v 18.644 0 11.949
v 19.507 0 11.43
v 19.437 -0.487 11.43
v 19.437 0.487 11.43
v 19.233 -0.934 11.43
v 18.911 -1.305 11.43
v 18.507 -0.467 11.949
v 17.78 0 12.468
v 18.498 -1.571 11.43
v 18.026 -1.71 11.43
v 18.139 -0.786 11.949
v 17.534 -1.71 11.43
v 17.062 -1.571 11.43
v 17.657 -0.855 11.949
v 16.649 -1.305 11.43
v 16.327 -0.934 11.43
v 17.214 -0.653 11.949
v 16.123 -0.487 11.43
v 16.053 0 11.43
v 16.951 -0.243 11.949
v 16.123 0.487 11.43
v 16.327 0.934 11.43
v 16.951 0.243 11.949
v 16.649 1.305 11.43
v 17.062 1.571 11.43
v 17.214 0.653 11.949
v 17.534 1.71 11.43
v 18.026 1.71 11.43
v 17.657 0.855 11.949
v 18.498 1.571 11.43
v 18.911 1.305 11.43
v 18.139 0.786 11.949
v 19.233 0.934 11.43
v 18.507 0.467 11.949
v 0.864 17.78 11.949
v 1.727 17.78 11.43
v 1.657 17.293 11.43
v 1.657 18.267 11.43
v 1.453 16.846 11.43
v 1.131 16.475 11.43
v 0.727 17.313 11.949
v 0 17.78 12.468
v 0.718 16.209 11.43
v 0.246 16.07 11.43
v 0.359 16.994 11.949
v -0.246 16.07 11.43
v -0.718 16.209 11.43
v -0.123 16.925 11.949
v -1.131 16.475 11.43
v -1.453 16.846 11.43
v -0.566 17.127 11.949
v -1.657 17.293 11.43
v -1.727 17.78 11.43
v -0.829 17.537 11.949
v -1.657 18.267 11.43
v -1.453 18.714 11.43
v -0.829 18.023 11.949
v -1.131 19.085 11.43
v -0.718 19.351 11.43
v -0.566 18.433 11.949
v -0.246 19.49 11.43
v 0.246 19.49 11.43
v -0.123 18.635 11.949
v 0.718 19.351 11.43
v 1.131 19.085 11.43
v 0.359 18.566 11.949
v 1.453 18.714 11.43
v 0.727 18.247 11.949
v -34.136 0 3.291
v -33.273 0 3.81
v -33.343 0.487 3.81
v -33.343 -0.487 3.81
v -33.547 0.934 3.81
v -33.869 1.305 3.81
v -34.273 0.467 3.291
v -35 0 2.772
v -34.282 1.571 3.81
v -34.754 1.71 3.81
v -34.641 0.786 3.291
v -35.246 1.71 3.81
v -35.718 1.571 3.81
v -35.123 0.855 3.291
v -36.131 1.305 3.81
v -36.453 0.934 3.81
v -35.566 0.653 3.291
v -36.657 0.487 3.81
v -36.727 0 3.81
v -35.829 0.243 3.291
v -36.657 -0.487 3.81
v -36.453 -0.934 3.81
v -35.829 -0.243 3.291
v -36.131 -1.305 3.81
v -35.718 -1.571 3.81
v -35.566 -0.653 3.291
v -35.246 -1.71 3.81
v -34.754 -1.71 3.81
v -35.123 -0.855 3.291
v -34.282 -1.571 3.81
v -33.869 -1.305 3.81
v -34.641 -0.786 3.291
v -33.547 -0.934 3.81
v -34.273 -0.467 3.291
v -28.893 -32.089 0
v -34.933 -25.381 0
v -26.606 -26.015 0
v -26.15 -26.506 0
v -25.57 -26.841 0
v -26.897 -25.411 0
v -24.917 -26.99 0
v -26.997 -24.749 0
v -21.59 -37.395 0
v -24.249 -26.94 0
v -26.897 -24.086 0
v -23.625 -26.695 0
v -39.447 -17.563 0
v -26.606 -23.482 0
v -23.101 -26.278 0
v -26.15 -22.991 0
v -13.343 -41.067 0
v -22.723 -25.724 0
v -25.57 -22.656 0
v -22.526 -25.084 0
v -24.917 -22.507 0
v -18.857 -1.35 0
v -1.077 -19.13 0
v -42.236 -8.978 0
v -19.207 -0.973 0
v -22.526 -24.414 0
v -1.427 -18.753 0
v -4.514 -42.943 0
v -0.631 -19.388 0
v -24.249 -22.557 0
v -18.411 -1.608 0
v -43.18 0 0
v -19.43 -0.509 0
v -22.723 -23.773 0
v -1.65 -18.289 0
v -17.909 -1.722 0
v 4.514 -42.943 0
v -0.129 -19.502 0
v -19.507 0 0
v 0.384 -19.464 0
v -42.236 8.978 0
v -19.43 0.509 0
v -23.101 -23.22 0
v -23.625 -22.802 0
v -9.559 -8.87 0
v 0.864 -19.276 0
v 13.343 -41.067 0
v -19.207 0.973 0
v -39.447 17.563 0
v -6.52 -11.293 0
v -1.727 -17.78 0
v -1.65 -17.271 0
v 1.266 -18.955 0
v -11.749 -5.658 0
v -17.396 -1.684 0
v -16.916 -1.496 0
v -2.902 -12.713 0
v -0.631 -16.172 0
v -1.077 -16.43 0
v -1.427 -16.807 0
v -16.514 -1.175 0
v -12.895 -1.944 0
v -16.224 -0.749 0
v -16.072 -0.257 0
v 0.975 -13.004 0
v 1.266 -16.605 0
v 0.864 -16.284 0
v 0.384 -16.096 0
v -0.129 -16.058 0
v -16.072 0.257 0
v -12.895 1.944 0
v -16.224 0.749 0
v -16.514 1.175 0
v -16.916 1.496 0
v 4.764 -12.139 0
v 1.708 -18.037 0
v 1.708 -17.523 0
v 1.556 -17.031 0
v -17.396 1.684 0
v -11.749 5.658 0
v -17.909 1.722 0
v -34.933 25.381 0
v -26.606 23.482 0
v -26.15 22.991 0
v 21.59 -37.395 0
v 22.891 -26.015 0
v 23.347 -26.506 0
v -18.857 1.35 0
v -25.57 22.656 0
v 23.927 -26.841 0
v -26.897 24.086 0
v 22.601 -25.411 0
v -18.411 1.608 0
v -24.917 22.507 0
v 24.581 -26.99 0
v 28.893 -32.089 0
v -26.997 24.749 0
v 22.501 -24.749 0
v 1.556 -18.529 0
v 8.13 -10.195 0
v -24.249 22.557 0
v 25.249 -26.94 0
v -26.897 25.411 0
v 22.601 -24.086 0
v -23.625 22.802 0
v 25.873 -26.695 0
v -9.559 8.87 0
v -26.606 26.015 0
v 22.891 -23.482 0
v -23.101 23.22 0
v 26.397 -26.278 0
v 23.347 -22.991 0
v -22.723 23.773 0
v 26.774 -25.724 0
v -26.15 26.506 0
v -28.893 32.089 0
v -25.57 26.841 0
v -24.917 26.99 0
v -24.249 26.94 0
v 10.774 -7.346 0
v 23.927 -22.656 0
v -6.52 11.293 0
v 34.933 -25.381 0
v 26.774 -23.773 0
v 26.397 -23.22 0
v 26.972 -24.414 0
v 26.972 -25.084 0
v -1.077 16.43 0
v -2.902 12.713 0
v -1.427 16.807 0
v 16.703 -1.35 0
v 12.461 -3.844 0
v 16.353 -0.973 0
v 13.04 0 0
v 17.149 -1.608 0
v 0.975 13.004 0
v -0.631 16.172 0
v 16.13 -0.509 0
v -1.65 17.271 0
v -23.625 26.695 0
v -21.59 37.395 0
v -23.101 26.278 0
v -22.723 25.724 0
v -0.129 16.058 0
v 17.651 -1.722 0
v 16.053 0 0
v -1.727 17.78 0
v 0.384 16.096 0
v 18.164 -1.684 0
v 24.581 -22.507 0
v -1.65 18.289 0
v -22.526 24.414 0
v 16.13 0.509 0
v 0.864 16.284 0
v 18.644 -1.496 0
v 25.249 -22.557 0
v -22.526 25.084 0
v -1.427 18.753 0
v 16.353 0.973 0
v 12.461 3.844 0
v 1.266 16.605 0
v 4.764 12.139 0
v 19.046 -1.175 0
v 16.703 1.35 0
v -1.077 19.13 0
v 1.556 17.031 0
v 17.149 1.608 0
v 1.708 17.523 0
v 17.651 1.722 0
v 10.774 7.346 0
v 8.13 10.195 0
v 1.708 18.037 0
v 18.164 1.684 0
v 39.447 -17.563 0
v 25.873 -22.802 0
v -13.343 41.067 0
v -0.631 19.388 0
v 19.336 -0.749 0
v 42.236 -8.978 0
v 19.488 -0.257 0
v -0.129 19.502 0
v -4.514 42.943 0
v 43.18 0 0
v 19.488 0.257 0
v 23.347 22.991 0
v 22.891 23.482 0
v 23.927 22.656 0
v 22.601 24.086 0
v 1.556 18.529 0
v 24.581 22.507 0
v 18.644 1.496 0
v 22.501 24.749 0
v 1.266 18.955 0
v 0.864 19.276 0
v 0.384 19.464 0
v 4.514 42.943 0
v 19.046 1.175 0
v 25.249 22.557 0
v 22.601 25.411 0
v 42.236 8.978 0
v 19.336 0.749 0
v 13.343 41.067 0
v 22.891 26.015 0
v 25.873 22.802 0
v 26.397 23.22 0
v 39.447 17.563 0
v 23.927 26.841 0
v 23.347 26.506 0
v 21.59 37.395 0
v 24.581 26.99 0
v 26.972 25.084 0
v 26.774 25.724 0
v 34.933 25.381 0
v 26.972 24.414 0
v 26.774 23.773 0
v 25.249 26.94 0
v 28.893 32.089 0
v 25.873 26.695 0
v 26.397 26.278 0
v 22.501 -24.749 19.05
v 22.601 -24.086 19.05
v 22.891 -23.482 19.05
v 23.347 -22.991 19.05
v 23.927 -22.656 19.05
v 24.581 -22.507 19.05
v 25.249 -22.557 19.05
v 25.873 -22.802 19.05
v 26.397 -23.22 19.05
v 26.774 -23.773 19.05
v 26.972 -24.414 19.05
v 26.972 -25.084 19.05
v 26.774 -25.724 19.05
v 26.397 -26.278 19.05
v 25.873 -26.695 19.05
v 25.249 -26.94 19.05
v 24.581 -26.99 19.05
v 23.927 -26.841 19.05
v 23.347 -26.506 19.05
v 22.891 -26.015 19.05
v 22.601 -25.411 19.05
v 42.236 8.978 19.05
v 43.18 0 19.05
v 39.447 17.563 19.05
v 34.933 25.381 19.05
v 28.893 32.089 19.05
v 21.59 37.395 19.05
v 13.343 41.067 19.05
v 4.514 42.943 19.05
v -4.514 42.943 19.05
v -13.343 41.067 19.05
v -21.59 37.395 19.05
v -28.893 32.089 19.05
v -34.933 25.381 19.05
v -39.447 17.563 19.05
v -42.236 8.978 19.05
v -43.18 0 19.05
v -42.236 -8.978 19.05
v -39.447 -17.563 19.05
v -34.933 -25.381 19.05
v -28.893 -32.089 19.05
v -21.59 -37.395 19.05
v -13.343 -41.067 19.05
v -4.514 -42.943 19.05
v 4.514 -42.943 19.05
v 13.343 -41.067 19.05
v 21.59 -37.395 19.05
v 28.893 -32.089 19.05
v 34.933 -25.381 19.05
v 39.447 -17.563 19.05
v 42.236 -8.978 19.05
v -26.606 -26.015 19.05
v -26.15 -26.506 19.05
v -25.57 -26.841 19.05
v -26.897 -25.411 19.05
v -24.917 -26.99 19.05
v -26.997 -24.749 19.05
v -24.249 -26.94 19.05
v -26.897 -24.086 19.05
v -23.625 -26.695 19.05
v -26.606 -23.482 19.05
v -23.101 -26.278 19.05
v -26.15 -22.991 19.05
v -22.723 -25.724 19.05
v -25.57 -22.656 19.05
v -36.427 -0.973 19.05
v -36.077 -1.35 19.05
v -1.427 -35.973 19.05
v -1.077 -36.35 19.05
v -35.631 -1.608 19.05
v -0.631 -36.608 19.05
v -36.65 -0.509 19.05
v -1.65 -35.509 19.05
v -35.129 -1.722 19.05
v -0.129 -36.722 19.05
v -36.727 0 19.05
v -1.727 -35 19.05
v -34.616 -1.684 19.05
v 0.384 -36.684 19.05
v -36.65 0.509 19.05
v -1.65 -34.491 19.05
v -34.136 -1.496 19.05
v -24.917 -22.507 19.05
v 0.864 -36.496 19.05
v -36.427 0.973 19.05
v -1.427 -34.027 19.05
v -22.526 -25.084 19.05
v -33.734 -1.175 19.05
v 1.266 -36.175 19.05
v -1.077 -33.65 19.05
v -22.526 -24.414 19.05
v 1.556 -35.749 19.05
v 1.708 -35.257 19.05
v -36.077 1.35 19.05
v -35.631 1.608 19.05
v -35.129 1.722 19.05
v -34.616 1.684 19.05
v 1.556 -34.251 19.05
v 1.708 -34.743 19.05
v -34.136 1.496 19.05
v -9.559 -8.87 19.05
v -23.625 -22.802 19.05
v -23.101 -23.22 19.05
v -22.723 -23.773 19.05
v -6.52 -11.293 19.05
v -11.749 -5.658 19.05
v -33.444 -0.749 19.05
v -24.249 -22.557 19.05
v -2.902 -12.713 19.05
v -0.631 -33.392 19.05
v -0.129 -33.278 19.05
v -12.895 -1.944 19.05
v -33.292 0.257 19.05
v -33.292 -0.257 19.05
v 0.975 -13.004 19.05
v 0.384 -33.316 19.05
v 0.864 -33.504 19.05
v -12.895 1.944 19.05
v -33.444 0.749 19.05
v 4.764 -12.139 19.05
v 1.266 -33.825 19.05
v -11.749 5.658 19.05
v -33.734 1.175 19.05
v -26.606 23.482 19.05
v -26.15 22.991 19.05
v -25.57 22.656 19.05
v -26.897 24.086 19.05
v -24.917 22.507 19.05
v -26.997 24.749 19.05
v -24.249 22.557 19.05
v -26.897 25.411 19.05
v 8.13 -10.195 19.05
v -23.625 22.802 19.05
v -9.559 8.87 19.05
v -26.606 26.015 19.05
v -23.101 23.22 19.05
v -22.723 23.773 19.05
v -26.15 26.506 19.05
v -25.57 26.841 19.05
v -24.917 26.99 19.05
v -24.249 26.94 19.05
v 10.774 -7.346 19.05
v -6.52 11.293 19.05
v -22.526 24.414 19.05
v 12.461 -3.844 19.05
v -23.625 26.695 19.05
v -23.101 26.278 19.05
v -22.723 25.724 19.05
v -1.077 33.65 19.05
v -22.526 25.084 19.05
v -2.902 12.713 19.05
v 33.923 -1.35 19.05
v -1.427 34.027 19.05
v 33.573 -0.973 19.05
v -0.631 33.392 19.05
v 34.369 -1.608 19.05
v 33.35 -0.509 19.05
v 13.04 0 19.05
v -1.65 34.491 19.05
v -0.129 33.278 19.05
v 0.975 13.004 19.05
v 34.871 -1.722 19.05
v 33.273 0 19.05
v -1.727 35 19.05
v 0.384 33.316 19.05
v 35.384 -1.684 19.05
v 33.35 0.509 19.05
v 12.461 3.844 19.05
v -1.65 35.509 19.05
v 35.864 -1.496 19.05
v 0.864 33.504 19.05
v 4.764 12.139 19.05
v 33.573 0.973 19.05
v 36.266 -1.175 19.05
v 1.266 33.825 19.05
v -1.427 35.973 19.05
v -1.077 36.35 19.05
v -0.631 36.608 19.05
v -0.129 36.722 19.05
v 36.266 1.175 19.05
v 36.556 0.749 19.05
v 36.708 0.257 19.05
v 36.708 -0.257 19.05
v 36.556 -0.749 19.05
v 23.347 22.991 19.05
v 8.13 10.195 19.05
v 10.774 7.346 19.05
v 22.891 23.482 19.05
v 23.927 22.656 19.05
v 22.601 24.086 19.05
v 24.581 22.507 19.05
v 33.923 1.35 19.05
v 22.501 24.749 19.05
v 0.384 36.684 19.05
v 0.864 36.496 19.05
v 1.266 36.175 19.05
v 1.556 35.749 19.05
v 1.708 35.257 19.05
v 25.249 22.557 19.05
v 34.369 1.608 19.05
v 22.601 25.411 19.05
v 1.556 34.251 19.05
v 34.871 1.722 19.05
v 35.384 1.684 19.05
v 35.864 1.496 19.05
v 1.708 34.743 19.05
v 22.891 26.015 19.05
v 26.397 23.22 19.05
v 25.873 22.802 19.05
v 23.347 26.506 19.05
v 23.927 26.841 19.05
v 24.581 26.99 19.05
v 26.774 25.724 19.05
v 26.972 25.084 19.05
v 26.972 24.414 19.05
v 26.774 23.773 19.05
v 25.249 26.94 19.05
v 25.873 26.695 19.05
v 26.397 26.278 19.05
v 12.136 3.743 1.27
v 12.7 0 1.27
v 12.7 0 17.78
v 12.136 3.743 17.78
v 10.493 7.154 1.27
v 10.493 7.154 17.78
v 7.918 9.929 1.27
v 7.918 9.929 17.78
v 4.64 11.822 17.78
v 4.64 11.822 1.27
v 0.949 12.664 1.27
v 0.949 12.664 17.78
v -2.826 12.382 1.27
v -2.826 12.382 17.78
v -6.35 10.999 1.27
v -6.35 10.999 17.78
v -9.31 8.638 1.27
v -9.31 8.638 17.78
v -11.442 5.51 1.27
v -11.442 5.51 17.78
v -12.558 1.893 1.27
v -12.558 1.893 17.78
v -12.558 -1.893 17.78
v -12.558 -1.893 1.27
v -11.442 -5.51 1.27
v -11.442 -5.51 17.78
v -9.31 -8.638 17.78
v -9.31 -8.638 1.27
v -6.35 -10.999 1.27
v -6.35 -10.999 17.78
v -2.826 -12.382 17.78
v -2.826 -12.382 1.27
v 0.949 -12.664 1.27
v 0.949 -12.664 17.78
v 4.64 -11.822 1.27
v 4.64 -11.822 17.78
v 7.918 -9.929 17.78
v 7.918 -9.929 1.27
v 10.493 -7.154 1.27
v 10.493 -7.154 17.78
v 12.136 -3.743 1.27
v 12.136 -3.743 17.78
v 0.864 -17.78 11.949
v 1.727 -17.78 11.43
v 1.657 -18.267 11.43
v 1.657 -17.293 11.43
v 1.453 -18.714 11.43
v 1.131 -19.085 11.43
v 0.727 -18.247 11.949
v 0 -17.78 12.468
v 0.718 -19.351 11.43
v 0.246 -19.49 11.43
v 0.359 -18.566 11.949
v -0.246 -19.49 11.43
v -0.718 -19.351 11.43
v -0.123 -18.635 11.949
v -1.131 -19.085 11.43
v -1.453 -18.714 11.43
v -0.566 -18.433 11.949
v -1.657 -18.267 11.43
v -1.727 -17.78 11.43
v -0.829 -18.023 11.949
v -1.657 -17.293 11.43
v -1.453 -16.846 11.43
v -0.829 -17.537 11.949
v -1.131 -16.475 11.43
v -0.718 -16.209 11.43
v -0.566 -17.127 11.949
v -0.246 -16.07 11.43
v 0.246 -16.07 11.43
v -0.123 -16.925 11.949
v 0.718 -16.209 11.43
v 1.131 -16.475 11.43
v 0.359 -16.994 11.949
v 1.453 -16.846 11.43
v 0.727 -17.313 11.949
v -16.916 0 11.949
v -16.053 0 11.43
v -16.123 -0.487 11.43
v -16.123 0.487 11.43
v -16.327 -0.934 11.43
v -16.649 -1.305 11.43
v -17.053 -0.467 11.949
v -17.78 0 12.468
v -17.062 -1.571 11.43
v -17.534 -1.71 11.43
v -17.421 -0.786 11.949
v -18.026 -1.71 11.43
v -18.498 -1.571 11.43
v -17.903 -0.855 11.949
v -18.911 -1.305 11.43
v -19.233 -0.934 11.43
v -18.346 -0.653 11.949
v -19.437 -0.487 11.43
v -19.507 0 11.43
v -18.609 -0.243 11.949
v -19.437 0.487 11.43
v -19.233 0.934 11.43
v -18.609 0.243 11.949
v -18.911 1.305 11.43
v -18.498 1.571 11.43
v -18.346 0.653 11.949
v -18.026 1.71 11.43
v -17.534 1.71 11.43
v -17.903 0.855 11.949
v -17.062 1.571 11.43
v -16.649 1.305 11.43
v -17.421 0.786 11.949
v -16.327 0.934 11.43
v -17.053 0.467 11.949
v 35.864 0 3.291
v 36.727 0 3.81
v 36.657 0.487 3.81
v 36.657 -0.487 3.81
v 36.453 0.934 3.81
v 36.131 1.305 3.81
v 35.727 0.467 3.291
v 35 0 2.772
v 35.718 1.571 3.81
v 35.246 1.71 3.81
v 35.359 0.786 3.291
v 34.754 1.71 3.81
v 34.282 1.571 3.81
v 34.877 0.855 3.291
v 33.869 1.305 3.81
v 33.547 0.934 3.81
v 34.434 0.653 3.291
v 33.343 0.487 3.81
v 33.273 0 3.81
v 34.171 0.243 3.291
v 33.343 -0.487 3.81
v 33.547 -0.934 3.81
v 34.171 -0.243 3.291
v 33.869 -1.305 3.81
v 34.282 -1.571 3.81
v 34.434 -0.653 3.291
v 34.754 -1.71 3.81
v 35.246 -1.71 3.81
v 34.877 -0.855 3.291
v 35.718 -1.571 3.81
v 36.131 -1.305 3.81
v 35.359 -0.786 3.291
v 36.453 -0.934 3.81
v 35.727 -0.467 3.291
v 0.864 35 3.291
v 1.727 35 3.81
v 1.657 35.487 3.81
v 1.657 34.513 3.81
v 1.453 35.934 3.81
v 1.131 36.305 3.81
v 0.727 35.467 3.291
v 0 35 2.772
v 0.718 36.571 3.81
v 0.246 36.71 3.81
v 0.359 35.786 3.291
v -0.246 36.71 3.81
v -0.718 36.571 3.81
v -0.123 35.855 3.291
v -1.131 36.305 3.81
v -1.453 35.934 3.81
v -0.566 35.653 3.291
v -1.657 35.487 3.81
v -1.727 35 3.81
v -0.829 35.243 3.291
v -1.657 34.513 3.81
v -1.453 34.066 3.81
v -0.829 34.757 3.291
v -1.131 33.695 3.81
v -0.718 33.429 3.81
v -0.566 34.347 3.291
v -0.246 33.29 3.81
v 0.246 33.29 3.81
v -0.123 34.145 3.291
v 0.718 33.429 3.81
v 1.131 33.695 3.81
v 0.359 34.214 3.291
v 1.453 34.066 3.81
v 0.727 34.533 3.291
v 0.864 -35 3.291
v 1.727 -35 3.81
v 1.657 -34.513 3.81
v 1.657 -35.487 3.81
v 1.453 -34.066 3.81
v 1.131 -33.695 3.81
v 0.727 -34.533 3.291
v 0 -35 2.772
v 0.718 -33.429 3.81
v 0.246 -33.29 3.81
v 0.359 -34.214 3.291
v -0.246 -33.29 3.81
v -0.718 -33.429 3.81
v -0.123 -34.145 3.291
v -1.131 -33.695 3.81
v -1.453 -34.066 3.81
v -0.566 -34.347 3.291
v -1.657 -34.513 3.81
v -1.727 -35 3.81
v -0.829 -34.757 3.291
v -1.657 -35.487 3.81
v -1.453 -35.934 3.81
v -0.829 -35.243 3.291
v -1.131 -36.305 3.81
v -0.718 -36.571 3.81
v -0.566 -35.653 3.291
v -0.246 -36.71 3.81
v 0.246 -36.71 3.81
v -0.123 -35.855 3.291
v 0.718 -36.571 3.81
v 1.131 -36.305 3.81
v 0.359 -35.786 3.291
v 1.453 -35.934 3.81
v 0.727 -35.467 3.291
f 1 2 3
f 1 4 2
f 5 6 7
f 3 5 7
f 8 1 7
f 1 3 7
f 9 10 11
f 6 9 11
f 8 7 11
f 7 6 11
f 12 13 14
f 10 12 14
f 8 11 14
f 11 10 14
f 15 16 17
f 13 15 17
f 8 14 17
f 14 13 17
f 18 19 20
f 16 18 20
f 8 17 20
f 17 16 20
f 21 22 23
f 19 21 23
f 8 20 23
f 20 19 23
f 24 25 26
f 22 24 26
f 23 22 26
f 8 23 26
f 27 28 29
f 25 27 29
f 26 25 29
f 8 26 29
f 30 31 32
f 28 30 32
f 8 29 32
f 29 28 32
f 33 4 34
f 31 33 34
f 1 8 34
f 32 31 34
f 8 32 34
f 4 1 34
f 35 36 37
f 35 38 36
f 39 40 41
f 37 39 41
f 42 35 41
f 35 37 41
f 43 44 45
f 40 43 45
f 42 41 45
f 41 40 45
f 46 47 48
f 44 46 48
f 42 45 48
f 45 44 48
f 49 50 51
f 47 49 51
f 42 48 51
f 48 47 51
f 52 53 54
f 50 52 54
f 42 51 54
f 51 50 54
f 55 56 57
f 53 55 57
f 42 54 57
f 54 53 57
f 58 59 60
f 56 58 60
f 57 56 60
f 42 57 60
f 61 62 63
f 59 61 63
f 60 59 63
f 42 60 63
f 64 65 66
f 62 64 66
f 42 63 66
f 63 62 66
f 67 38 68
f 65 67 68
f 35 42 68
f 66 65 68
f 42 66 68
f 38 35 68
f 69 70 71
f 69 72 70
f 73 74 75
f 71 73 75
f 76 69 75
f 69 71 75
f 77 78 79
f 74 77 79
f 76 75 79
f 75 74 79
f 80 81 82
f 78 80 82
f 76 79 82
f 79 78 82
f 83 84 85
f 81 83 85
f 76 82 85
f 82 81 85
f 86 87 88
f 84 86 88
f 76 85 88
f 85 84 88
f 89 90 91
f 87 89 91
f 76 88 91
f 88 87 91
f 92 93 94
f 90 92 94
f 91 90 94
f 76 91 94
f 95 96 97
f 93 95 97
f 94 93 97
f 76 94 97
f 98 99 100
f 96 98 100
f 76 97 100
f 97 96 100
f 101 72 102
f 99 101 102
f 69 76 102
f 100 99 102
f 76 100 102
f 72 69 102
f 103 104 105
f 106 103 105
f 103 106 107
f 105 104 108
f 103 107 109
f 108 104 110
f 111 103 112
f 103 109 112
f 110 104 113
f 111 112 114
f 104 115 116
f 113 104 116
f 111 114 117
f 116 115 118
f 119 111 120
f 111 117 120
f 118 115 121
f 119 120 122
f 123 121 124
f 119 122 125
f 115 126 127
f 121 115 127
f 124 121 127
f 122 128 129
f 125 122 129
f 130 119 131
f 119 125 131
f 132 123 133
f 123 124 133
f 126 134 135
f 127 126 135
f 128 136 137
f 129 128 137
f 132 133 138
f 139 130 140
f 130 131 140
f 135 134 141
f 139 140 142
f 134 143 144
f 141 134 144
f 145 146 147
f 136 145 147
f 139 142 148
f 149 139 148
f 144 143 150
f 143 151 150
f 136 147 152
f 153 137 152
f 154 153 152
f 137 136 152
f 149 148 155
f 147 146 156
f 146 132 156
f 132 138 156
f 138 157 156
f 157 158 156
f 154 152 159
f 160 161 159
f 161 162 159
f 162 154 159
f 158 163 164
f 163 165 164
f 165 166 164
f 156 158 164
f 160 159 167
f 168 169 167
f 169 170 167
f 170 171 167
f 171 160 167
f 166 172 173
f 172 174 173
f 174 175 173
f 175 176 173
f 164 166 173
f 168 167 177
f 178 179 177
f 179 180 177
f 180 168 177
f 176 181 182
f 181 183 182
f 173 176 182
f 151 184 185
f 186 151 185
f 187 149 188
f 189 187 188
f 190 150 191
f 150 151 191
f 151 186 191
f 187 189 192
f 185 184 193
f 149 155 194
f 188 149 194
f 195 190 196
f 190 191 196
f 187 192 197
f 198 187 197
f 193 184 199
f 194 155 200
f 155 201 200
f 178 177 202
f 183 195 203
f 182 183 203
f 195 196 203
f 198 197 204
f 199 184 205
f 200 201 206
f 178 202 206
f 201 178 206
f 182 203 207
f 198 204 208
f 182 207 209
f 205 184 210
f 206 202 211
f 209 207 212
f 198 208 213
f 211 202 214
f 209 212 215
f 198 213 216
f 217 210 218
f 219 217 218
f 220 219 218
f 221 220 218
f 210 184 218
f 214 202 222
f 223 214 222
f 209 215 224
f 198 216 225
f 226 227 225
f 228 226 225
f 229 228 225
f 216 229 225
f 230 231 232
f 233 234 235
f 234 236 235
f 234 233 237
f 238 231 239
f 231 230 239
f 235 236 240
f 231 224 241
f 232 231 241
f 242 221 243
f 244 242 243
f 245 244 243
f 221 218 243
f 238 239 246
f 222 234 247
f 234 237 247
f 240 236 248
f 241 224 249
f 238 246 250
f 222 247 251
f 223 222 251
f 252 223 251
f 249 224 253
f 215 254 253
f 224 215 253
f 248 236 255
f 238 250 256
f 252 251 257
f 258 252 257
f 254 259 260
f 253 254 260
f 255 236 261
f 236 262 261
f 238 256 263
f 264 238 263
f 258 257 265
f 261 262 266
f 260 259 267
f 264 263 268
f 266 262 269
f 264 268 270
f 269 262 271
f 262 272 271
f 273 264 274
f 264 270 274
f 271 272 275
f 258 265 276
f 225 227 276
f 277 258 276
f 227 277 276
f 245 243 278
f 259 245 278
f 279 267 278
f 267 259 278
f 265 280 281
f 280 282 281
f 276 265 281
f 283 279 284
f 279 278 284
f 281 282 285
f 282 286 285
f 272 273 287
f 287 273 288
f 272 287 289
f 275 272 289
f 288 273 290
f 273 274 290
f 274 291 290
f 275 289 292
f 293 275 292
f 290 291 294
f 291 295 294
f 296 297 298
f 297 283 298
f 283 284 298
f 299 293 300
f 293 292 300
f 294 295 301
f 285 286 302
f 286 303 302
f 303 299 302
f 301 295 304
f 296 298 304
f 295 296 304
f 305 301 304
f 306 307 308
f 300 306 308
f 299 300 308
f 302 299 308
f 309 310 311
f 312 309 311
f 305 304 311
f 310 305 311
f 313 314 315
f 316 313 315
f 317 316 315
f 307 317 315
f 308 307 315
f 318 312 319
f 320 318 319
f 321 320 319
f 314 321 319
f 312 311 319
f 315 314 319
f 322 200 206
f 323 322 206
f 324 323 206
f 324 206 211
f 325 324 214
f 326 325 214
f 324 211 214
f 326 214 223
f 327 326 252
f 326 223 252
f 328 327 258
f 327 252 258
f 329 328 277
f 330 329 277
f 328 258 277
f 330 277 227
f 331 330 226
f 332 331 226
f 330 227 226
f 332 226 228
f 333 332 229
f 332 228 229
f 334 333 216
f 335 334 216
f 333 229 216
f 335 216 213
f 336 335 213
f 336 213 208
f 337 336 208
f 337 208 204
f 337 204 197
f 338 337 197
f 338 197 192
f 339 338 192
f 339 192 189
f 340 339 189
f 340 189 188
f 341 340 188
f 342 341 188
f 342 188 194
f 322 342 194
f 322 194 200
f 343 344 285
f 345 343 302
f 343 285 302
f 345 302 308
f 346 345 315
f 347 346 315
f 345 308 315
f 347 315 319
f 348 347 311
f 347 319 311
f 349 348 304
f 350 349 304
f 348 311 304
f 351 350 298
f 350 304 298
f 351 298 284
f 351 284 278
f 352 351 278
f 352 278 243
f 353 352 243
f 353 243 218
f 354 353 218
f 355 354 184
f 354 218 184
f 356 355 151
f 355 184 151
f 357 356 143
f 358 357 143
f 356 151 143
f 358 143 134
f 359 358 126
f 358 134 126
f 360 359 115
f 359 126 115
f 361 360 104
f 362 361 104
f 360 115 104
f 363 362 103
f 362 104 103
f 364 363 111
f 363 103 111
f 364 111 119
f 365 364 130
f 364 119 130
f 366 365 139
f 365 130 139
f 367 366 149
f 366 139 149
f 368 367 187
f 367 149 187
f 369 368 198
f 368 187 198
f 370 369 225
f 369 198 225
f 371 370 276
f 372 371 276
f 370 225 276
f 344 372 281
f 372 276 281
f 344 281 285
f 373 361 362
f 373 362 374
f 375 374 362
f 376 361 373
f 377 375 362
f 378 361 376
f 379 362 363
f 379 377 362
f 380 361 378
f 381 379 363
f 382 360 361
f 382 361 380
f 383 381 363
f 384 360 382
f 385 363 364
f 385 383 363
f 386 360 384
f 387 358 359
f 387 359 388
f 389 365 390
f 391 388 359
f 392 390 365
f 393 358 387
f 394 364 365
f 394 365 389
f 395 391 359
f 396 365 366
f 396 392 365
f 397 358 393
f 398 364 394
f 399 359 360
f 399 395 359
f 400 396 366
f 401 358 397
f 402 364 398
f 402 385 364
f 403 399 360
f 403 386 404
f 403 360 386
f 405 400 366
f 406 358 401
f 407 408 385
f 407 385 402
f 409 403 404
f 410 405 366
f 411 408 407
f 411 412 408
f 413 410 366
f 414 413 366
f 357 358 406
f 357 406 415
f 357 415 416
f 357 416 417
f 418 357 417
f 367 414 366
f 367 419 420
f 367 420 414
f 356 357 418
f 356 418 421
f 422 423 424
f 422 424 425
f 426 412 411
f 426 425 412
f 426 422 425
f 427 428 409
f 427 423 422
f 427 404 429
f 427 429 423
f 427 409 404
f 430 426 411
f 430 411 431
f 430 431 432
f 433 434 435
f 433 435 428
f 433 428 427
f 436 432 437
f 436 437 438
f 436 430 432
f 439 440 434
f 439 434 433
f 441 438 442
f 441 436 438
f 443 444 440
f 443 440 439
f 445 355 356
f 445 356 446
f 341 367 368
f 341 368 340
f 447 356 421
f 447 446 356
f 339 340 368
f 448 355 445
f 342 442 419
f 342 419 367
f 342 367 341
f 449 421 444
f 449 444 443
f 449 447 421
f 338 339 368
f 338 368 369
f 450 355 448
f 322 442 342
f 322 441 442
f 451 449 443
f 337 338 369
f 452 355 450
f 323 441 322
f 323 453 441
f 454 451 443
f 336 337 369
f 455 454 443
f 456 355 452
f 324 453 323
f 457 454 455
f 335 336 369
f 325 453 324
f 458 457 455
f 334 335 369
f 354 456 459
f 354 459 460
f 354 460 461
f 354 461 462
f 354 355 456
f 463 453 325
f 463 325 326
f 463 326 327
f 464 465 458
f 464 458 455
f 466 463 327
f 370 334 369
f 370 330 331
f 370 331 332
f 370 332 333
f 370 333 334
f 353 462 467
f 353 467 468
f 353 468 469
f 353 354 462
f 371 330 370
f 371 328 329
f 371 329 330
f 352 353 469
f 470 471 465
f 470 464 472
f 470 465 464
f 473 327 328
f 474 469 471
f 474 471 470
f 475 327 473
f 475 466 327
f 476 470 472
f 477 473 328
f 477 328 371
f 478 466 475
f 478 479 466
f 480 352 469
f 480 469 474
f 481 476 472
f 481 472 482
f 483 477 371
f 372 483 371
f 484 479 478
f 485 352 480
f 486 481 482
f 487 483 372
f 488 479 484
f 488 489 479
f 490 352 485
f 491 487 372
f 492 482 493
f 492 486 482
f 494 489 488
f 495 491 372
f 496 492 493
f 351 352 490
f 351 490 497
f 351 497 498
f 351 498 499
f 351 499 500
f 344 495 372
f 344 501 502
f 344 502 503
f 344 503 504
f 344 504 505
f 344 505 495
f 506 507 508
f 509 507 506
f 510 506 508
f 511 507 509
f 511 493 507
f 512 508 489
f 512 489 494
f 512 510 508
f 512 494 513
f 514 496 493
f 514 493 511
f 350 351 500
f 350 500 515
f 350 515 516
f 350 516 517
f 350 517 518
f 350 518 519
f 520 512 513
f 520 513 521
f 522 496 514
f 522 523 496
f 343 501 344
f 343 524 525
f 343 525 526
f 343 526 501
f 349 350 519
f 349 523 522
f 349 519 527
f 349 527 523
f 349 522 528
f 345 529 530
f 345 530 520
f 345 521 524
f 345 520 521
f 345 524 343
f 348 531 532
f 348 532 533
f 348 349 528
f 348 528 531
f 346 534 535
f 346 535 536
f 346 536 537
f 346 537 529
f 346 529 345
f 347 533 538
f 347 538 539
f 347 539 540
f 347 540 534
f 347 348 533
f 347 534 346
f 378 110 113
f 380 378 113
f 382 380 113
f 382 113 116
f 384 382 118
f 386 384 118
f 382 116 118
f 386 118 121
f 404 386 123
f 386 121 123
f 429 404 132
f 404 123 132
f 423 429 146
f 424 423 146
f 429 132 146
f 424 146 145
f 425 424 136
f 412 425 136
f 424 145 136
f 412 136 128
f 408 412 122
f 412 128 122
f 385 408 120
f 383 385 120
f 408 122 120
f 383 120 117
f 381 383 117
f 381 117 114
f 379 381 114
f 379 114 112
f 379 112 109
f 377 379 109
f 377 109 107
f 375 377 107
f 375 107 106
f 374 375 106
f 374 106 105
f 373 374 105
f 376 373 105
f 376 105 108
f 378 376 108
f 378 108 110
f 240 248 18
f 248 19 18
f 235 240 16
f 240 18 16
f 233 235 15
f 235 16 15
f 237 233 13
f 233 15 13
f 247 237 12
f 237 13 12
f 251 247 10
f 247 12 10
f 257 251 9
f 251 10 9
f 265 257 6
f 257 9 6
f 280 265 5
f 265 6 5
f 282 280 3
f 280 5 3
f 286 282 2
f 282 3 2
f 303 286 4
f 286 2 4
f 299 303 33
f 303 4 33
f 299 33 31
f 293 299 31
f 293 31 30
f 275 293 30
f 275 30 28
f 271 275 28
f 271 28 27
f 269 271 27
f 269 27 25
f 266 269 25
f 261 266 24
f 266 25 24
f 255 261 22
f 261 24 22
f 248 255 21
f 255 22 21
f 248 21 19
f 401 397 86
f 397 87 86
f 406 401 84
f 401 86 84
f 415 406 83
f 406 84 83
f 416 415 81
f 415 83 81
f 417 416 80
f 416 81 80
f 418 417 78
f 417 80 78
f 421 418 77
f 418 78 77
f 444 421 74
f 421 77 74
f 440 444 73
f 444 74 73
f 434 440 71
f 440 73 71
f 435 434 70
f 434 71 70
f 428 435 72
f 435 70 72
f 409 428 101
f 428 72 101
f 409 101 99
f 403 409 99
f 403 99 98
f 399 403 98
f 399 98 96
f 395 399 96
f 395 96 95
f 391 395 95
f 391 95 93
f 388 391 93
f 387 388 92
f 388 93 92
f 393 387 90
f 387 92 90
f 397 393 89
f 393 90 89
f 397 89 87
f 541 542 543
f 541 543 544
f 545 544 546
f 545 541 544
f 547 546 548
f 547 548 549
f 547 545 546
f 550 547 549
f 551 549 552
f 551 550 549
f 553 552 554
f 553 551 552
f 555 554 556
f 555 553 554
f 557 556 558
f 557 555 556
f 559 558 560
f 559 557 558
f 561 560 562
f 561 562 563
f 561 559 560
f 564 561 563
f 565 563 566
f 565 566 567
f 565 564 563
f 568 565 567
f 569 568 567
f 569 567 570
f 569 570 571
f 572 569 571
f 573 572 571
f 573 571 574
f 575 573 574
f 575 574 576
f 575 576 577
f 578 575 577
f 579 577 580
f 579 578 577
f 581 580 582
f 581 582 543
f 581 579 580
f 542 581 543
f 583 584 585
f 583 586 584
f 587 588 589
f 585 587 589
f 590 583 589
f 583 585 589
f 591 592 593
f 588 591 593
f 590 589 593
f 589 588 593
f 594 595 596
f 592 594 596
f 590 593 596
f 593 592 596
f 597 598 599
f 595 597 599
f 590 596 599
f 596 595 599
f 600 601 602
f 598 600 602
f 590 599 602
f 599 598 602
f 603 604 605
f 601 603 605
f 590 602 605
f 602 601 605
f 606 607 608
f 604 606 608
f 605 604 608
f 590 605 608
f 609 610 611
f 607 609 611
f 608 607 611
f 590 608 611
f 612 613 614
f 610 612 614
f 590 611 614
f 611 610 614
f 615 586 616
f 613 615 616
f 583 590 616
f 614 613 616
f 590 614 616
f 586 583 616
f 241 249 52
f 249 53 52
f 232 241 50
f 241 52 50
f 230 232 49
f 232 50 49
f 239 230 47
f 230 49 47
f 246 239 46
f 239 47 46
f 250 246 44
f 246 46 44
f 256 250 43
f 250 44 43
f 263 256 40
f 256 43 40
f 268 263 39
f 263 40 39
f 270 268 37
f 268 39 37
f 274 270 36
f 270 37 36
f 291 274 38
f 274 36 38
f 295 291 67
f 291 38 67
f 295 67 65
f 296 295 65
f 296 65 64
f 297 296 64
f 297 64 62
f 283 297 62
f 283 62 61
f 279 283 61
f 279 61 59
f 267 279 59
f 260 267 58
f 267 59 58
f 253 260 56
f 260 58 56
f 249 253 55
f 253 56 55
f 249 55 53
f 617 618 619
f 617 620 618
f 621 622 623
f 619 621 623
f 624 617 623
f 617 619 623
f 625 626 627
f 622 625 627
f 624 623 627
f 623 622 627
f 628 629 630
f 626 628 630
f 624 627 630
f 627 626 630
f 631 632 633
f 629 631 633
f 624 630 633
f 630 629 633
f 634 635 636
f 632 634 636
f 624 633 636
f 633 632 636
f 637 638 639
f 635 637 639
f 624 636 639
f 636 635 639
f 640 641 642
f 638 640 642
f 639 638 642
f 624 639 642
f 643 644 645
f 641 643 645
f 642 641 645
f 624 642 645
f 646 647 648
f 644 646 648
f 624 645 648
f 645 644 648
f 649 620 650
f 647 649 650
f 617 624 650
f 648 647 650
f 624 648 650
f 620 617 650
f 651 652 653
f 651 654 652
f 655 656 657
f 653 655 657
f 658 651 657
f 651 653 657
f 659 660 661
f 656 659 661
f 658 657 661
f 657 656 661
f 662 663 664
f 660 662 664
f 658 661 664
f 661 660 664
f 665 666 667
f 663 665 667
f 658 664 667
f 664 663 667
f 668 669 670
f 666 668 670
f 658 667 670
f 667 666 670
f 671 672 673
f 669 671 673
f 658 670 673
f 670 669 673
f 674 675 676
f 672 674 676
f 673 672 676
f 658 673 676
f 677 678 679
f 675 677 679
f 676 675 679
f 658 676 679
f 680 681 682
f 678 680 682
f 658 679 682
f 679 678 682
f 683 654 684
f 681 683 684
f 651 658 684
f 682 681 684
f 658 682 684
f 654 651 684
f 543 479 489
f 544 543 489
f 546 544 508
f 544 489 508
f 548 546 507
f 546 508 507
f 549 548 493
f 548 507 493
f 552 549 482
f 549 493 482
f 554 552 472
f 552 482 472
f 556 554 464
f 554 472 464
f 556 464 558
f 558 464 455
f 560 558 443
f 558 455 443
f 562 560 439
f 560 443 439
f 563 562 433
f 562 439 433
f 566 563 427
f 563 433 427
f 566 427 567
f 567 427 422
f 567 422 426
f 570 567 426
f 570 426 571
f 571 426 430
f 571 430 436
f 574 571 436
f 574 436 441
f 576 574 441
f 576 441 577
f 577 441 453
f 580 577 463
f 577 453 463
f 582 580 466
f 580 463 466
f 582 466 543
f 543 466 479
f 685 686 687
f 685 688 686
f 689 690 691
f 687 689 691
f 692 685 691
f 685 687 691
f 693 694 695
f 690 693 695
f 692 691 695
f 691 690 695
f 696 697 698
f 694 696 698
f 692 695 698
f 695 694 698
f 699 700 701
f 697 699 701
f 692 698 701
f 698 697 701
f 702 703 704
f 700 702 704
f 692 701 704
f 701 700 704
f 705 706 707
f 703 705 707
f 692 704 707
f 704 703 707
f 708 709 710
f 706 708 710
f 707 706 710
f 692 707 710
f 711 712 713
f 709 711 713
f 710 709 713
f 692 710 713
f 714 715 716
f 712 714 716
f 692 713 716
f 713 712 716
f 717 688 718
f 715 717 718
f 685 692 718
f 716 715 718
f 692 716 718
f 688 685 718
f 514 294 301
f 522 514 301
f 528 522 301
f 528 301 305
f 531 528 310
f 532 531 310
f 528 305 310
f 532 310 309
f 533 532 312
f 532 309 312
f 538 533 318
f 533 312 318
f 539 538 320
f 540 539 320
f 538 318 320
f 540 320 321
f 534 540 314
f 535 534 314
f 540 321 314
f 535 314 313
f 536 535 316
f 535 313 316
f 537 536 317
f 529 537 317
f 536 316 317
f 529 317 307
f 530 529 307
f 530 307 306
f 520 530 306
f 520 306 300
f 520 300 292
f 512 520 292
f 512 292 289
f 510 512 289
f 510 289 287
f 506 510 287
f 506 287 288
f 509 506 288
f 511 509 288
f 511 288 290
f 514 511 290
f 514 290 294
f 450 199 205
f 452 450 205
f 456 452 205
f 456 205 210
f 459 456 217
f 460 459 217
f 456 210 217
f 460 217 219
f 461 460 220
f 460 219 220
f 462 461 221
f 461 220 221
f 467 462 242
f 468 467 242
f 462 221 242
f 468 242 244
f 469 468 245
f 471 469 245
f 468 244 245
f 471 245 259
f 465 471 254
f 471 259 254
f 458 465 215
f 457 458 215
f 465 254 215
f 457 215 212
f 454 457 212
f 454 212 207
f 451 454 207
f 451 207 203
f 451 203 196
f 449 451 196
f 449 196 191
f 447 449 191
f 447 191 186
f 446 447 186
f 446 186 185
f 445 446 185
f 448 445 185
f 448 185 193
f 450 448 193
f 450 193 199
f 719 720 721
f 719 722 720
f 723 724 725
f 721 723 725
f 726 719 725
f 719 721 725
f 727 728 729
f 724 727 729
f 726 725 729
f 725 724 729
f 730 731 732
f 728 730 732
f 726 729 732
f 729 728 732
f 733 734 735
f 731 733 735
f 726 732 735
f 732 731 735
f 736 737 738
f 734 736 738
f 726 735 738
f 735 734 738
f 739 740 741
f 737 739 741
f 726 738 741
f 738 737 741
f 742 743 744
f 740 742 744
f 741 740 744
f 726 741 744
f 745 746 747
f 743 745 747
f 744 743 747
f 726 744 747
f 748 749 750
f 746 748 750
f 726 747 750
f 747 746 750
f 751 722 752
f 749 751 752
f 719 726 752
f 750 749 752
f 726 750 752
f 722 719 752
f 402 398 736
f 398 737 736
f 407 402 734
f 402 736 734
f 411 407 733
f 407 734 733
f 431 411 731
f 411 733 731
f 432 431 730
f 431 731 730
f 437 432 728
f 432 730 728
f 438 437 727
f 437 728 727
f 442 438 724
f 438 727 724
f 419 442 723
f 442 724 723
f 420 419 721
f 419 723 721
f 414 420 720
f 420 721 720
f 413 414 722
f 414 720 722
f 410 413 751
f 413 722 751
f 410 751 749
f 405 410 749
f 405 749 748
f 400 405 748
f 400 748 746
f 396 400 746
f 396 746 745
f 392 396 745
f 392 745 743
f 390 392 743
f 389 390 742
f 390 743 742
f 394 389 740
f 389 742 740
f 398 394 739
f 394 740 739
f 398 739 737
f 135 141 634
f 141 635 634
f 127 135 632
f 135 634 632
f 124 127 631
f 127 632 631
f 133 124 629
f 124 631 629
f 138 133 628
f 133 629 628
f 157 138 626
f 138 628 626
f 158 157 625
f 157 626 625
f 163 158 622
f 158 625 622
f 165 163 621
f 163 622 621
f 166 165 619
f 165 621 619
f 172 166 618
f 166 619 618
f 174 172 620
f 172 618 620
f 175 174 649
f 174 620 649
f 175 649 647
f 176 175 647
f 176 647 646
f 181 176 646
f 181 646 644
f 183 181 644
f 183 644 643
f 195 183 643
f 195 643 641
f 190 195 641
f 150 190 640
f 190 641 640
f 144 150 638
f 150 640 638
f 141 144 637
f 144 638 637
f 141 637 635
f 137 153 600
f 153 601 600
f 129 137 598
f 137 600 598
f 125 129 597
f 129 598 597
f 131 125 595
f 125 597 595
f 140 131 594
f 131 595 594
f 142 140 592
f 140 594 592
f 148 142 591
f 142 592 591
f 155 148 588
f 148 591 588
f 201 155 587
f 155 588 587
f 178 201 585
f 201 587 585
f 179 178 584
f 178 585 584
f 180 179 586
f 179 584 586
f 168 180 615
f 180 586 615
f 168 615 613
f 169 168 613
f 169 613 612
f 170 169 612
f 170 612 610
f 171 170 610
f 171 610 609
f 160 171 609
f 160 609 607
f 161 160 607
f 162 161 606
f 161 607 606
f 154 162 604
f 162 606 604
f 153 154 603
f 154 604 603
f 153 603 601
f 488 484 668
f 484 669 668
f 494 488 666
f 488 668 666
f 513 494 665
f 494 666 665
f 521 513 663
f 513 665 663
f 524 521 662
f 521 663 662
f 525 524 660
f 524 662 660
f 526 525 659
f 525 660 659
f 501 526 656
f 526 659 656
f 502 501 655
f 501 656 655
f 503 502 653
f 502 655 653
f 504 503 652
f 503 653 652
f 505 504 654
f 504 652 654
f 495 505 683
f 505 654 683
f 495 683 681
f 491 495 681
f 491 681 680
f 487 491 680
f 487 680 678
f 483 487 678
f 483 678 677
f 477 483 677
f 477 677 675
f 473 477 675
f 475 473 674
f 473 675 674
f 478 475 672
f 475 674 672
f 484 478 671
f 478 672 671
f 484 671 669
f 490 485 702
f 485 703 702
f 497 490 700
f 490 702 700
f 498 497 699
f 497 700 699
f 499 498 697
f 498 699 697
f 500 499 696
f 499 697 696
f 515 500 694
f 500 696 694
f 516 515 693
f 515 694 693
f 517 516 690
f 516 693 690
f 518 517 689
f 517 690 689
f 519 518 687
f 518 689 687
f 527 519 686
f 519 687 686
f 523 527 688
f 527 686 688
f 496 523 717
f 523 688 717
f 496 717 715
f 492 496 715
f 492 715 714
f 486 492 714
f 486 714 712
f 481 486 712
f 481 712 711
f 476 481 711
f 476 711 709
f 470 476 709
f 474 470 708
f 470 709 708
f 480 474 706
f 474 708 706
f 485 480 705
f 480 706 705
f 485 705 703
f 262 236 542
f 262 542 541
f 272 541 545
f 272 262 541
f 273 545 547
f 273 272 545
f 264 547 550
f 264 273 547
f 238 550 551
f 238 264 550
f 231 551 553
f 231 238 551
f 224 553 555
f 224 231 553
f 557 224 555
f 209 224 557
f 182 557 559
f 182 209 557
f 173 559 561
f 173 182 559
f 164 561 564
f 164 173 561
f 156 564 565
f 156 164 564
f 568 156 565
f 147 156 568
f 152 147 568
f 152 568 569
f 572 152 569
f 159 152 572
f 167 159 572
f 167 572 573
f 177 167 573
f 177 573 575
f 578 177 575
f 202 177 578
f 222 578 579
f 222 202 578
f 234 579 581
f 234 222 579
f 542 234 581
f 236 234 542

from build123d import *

# Parameters (mm, degrees)
F0_R     = 43.18
F0_R_2   = 12.7
F1_DEPTH = 19.05
F2_SIZE2 = 0.3402954744
F2_SIZE  = 1.27
F4_D     = 3.4544
F4_DEPTH = 11.43
F4_TIP   = 1.0378064612
F6_D     = 3.4544
F6_DEPTH = 15.24
F6_TIP   = 1.0378064612
F8_D     = 4.4958


with BuildPart() as f1:
    # F0 (on Top) → F1 (new body)
    with BuildSketch(Plane.XY):
        Circle(F0_R)
        Circle(F0_R_2, mode=Mode.SUBTRACT)
    extrude(amount=F1_DEPTH)

    # F2
    f2_edges = [f1.edges().sort_by_distance(p)[0] for p in [
        (-12.7, 0, 19.05),
        (-12.7, 0, 0),
    ]]
    f2_side = f1.faces().sort_by_distance((-12.7, 0, 9.525))[0]
    chamfer(f2_edges, length=F2_SIZE, length2=F2_SIZE2, reference=f2_side)

    # F4
    with Locations(Plane(origin=(0, 0, 0), x_dir=(1, 0, 0), z_dir=(0, 0, -1))):
        with Locations((0, -17.78), (-17.78, 0), (0, 17.78), (17.78, 0)):
            Hole(F4_D / 2, depth=F4_DEPTH)
            with Locations((0, 0, -(F4_DEPTH + F4_TIP / 2))):  # 118° drill point
                Cone(0, F4_D / 2, F4_TIP, mode=Mode.SUBTRACT)

    # F6
    with Locations(Plane.XY.offset(19.05)):
        with Locations((35, 0), (0, -35), (-35, 0), (0, 35)):
            Hole(F6_D / 2, depth=F6_DEPTH)
            with Locations((0, 0, -(F6_DEPTH + F6_TIP / 2))):  # 118° drill point
                Cone(0, F6_D / 2, F6_TIP, mode=Mode.SUBTRACT)

    # F8 (through all)
    with Locations(Plane.XY.offset(19.05)):
        with Locations((24.7487373415, -24.7487373415), (-24.7487373415, -24.7487373415), (-24.7487373415, 24.7487373415), (24.7487373415, 24.7487373415)):
            Hole(F8_D / 2)


solid = f1.part
